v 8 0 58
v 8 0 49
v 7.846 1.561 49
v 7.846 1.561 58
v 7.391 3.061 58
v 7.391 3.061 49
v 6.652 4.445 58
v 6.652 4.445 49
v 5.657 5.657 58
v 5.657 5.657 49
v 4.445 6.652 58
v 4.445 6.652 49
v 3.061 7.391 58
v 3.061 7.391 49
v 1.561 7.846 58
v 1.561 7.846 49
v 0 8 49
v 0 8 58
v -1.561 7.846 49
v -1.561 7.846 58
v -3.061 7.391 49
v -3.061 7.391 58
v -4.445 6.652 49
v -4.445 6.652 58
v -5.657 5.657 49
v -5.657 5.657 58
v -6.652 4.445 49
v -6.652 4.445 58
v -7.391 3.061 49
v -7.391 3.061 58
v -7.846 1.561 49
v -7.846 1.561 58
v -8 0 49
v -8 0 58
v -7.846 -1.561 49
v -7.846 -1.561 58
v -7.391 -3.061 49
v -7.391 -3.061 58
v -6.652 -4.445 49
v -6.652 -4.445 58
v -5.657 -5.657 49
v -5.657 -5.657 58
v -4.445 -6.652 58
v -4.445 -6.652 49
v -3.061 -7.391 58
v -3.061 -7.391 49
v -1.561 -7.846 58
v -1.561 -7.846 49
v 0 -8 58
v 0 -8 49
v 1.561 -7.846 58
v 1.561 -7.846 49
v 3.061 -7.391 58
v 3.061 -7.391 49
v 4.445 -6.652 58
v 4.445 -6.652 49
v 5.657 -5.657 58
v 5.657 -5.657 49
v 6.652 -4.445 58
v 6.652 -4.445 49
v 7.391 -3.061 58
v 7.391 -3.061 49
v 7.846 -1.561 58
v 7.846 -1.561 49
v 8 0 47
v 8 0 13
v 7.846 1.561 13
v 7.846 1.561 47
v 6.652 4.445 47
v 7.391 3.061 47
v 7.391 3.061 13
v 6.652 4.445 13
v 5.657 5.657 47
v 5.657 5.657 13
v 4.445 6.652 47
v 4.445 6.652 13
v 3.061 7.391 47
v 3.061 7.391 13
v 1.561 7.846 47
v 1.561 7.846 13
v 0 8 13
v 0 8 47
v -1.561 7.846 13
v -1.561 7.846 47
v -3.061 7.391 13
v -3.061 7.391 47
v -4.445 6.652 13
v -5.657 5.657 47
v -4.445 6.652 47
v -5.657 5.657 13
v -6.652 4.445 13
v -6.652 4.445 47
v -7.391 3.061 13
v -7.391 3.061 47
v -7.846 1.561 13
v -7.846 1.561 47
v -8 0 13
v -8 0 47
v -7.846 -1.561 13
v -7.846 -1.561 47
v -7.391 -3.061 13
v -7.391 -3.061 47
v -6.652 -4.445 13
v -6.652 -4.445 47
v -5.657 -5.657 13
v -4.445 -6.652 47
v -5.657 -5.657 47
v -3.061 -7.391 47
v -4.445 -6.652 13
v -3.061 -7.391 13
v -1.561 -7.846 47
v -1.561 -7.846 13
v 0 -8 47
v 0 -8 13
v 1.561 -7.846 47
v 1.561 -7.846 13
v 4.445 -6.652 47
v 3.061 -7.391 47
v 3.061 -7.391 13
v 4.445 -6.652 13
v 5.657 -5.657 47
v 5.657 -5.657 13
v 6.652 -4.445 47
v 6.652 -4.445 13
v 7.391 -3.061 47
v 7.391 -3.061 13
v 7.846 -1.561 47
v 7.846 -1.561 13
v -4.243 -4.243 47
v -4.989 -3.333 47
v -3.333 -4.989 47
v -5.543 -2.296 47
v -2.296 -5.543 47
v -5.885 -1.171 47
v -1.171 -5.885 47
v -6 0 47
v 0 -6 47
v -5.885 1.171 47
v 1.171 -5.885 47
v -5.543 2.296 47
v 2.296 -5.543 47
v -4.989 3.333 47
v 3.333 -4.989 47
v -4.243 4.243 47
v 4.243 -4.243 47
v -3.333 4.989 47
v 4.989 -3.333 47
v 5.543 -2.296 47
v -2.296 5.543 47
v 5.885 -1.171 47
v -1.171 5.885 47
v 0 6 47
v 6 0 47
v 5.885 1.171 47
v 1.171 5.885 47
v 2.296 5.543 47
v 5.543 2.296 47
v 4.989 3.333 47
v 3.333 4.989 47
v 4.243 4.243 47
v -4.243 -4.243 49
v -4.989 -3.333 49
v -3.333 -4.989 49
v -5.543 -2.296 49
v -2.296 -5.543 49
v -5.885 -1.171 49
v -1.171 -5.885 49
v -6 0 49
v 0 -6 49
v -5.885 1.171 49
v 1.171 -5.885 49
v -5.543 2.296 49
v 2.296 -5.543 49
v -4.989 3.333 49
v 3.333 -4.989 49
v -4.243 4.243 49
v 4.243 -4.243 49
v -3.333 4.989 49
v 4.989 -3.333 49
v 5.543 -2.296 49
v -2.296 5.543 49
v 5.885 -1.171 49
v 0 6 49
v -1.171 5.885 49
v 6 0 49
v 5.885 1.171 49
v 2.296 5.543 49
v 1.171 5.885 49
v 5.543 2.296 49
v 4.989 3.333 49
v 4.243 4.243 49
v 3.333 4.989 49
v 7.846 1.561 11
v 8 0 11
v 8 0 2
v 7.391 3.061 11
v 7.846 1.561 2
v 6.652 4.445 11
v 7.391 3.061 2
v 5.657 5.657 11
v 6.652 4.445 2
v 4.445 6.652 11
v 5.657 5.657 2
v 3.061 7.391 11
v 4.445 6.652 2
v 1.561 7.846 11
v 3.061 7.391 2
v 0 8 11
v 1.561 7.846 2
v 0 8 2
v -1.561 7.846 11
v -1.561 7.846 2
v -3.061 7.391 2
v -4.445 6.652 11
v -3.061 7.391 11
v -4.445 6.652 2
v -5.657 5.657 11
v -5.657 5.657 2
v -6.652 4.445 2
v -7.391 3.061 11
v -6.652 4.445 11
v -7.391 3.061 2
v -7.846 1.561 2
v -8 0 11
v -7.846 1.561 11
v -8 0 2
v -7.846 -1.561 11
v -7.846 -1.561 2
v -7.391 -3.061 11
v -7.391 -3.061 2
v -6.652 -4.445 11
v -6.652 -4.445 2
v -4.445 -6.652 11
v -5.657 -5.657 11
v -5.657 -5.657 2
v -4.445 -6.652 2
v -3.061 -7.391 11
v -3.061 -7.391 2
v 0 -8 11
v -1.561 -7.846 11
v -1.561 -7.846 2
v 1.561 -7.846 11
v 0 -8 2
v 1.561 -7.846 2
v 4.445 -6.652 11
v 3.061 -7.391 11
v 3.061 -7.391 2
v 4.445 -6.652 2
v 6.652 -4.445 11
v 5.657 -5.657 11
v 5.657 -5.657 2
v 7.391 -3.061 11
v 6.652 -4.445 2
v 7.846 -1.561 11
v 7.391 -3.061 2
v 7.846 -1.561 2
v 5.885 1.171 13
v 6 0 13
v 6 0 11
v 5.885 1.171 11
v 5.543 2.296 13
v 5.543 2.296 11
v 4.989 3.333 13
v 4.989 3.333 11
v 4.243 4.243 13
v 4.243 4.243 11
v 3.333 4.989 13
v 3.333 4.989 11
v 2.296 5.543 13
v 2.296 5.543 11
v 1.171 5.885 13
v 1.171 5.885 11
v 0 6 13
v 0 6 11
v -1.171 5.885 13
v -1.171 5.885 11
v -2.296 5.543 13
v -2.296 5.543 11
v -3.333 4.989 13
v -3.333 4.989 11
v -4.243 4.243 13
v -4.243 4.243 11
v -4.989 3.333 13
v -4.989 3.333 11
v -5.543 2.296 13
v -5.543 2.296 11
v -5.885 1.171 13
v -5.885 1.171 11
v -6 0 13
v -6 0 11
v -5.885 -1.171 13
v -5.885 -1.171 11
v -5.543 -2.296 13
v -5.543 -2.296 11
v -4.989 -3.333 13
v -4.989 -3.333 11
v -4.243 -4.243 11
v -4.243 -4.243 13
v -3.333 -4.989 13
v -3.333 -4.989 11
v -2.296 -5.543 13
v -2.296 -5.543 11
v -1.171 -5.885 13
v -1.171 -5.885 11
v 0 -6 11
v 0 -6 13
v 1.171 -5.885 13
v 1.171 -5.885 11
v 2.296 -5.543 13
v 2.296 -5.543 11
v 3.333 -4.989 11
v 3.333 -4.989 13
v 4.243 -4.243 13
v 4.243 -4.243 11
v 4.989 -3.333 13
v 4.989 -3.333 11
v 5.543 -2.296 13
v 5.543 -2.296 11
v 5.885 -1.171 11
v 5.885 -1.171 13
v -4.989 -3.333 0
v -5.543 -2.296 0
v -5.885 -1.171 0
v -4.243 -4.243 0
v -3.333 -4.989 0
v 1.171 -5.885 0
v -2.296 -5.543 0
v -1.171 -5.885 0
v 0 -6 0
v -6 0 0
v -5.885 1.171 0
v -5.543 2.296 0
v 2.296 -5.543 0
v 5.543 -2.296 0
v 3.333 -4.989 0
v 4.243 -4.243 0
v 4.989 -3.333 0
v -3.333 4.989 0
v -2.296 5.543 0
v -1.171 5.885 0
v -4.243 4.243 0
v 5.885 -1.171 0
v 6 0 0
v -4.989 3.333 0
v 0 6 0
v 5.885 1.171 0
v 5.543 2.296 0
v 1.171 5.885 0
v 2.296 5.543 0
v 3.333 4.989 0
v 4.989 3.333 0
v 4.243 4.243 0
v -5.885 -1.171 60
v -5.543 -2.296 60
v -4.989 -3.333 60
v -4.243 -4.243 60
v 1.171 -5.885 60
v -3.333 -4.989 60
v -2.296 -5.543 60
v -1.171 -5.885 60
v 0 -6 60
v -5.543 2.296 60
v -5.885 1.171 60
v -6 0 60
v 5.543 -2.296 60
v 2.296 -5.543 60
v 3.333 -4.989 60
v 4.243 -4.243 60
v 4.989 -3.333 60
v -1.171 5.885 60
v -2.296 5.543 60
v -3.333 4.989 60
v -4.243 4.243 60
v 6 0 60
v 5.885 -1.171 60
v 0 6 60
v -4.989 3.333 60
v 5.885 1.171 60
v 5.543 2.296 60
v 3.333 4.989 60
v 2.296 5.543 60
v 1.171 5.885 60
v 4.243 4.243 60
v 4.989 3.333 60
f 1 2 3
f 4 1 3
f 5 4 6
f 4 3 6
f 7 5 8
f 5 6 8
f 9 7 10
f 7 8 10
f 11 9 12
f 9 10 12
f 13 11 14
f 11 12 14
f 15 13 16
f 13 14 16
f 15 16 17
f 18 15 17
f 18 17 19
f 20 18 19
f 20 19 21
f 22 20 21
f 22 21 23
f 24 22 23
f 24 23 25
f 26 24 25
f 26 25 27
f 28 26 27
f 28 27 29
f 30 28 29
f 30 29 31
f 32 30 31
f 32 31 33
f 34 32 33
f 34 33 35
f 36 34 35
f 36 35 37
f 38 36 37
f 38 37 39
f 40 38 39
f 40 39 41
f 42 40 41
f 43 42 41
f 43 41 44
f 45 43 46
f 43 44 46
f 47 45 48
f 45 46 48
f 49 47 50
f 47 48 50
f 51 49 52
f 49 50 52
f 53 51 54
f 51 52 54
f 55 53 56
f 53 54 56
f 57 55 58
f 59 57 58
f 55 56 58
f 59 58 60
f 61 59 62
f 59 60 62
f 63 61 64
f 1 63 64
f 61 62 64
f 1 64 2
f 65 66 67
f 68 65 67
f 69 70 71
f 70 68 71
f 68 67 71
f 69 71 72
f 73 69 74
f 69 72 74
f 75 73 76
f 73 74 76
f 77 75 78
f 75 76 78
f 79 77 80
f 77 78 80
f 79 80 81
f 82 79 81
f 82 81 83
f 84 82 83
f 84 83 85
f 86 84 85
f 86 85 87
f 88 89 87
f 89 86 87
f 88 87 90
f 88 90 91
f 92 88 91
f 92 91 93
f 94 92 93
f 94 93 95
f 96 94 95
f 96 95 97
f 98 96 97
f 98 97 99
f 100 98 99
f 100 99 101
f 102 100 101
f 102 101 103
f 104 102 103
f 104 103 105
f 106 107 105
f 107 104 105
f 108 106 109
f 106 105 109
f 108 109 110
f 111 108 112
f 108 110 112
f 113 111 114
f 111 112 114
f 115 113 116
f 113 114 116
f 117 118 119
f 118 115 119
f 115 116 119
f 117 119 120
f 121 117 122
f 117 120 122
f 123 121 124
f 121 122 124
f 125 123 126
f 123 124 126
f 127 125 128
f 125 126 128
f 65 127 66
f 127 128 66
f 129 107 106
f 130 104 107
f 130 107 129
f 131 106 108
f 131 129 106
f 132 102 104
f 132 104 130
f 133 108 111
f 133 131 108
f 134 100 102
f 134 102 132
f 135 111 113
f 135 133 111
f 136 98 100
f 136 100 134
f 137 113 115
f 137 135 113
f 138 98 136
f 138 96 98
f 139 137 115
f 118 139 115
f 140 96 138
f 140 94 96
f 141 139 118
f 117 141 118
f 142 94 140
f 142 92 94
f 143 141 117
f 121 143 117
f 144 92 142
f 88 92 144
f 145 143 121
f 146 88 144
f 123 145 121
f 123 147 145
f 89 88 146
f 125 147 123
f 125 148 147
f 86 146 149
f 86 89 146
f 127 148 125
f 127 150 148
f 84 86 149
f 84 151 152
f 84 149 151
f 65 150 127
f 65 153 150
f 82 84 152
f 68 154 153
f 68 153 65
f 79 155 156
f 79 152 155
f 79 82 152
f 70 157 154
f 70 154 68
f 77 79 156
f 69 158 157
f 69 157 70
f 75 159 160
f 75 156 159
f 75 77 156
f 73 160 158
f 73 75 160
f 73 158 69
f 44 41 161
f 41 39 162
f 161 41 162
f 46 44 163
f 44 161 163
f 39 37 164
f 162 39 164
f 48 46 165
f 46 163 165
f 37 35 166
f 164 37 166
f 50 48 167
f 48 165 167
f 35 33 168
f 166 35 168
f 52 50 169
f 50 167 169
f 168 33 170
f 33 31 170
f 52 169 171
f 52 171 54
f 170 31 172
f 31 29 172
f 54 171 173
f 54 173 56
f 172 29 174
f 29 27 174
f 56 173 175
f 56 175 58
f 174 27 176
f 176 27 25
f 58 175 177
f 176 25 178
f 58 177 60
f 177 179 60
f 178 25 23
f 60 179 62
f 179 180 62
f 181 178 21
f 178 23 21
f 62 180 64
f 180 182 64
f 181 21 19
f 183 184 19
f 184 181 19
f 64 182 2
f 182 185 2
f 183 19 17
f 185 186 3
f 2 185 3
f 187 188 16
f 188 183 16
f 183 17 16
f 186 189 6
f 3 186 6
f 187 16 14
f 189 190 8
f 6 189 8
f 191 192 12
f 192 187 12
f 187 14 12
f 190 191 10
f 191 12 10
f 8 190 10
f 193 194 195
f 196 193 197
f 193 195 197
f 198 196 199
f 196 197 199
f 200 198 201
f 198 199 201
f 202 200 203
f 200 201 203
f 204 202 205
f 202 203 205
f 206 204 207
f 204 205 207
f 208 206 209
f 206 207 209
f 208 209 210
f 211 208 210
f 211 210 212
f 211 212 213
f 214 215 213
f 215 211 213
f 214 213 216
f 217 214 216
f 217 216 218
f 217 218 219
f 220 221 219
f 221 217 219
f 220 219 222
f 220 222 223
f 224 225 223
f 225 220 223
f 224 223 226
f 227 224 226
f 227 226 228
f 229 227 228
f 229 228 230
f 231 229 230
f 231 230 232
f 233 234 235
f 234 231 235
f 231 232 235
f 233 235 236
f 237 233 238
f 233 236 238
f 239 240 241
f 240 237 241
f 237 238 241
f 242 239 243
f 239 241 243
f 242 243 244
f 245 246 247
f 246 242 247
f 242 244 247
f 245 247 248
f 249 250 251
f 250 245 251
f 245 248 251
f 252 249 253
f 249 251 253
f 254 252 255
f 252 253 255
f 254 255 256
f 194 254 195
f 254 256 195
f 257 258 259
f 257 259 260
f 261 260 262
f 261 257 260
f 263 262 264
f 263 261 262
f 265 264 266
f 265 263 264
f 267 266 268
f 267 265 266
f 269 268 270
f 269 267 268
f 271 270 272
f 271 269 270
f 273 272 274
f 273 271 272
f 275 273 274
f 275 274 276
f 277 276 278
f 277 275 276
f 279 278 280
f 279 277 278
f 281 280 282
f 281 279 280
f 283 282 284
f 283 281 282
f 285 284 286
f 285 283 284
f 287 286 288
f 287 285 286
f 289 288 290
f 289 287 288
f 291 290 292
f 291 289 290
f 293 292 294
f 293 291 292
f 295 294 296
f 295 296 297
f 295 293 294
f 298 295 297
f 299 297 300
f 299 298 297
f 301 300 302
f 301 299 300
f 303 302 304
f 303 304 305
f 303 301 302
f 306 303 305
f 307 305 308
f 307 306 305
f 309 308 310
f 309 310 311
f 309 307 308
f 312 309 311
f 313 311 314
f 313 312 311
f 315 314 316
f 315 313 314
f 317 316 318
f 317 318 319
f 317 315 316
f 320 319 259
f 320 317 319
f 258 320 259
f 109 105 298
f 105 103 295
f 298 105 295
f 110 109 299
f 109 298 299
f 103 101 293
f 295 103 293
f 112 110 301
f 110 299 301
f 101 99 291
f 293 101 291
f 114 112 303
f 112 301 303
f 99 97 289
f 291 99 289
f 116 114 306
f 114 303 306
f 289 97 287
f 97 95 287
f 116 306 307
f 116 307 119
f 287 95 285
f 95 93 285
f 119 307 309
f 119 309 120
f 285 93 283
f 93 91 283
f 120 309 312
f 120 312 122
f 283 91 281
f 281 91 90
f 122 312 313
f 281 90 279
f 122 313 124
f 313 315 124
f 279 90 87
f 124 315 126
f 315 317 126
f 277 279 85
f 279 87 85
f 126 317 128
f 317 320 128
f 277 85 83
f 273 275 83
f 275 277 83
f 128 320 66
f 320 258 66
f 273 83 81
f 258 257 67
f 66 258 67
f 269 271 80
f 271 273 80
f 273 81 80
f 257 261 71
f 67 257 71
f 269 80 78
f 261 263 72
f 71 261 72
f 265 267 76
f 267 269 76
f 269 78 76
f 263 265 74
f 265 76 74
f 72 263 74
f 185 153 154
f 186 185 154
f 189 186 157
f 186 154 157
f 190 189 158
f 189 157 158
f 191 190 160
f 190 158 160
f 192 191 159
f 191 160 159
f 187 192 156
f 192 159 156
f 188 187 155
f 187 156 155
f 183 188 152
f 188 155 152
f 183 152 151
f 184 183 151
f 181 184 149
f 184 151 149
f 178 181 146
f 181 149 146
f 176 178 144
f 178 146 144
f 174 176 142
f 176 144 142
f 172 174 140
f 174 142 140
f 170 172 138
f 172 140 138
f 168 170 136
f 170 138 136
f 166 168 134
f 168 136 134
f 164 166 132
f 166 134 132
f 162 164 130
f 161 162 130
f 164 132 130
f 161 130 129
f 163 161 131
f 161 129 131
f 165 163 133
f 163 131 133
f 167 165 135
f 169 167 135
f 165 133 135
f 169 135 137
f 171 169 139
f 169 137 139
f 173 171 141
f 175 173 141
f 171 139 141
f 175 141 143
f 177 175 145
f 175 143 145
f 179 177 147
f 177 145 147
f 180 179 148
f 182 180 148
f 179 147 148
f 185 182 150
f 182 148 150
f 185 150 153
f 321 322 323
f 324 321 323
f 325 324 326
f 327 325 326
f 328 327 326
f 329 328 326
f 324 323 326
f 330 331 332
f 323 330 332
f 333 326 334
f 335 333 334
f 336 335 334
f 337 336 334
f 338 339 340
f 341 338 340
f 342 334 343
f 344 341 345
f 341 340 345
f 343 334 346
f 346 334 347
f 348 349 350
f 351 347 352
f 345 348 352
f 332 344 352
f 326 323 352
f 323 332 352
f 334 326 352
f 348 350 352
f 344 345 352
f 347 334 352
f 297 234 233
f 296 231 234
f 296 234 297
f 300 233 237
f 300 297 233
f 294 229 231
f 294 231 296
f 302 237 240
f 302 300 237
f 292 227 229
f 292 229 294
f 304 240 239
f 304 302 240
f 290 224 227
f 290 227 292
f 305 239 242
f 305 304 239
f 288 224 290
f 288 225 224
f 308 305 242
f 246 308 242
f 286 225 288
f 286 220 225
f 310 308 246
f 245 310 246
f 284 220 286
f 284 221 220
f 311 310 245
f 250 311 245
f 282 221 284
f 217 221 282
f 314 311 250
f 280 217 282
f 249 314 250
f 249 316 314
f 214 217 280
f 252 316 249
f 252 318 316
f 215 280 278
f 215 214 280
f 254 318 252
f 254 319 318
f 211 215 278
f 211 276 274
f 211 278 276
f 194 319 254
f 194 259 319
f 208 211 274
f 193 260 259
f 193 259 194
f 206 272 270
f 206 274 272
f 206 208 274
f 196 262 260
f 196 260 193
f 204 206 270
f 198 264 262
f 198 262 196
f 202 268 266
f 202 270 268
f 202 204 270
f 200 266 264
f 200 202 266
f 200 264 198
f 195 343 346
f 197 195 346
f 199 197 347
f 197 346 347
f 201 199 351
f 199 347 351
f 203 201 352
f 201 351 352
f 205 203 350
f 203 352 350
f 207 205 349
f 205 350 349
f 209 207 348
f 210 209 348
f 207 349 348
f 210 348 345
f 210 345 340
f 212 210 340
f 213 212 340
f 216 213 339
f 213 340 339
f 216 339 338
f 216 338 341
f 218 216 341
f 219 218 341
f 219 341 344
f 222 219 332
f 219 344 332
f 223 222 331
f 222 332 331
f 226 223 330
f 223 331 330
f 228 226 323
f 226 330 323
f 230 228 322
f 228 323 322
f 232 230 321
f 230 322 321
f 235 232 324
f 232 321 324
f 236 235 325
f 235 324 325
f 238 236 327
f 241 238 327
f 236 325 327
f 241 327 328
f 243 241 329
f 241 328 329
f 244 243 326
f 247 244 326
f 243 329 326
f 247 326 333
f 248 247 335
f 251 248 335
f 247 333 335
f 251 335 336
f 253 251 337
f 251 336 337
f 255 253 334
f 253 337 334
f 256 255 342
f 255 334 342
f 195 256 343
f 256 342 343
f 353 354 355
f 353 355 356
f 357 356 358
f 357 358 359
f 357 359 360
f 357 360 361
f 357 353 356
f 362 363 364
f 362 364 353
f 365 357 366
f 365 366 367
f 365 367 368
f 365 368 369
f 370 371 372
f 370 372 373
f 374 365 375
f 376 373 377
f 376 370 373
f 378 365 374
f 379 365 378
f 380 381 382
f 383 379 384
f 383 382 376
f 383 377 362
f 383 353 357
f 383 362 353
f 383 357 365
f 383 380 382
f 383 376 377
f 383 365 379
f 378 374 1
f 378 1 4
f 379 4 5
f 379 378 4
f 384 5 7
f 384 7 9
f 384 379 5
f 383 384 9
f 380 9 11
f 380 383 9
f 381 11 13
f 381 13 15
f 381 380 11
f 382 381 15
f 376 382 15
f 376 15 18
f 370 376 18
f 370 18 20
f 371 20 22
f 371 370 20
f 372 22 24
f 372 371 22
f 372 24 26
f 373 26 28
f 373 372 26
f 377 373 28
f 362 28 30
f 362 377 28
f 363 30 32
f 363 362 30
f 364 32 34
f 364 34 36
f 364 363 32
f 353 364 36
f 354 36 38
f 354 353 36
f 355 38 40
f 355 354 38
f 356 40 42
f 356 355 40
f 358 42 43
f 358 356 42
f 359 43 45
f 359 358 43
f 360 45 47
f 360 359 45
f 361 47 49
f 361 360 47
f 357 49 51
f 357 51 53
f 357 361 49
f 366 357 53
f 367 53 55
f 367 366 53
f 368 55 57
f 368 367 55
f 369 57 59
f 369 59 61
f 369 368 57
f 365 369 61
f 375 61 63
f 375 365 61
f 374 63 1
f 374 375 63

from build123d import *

# Parameters (mm, degrees)
SKETCH_1_R          = 8
EXTRUDE_1_DEPTH     = 60
CHAMFER_1_SIZE      = 2
SKETCH_3_OUTSIDE_W  = 30.824
SKETCH_3_OUTSIDE_H  = 30.824
SKETCH_3_OUTSIDE_R  = 6
CUT_EXTRUDE_1_DEPTH = 2
SKETCH_4_OUTSIDE_W  = 30.824
SKETCH_4_OUTSIDE_H  = 30.824
SKETCH_4_OUTSIDE_R  = 6
CUT_EXTRUDE_2_DEPTH = 2


with BuildPart() as part:
    # 草图1 → 凸台-拉伸1 (new body)
    with BuildSketch(Plane.XY):
        Circle(SKETCH_1_R)
    extrude(amount=EXTRUDE_1_DEPTH)

    # 倒角1
    chamfer_1_edges = [part.edges().sort_by_distance(p)[0] for p in [
        (-8, 0, 0),
        (-8, 0, 60),
    ]]
    chamfer(chamfer_1_edges, length=CHAMFER_1_SIZE)

    # 草图3 outside → 切除-拉伸1 (cut)
    with BuildSketch(Plane.XY.offset(13)):
        Rectangle(SKETCH_3_OUTSIDE_W, SKETCH_3_OUTSIDE_H)
        Circle(SKETCH_3_OUTSIDE_R, mode=Mode.SUBTRACT)
    extrude(amount=-CUT_EXTRUDE_1_DEPTH, mode=Mode.SUBTRACT)

    # 草图4 outside → 切除-拉伸2 (cut)
    with BuildSketch(Plane.XY.offset(47)):
        Rectangle(SKETCH_4_OUTSIDE_W, SKETCH_4_OUTSIDE_H)
        Circle(SKETCH_4_OUTSIDE_R, mode=Mode.SUBTRACT)
    extrude(amount=CUT_EXTRUDE_2_DEPTH, mode=Mode.SUBTRACT)


solid = part.part
